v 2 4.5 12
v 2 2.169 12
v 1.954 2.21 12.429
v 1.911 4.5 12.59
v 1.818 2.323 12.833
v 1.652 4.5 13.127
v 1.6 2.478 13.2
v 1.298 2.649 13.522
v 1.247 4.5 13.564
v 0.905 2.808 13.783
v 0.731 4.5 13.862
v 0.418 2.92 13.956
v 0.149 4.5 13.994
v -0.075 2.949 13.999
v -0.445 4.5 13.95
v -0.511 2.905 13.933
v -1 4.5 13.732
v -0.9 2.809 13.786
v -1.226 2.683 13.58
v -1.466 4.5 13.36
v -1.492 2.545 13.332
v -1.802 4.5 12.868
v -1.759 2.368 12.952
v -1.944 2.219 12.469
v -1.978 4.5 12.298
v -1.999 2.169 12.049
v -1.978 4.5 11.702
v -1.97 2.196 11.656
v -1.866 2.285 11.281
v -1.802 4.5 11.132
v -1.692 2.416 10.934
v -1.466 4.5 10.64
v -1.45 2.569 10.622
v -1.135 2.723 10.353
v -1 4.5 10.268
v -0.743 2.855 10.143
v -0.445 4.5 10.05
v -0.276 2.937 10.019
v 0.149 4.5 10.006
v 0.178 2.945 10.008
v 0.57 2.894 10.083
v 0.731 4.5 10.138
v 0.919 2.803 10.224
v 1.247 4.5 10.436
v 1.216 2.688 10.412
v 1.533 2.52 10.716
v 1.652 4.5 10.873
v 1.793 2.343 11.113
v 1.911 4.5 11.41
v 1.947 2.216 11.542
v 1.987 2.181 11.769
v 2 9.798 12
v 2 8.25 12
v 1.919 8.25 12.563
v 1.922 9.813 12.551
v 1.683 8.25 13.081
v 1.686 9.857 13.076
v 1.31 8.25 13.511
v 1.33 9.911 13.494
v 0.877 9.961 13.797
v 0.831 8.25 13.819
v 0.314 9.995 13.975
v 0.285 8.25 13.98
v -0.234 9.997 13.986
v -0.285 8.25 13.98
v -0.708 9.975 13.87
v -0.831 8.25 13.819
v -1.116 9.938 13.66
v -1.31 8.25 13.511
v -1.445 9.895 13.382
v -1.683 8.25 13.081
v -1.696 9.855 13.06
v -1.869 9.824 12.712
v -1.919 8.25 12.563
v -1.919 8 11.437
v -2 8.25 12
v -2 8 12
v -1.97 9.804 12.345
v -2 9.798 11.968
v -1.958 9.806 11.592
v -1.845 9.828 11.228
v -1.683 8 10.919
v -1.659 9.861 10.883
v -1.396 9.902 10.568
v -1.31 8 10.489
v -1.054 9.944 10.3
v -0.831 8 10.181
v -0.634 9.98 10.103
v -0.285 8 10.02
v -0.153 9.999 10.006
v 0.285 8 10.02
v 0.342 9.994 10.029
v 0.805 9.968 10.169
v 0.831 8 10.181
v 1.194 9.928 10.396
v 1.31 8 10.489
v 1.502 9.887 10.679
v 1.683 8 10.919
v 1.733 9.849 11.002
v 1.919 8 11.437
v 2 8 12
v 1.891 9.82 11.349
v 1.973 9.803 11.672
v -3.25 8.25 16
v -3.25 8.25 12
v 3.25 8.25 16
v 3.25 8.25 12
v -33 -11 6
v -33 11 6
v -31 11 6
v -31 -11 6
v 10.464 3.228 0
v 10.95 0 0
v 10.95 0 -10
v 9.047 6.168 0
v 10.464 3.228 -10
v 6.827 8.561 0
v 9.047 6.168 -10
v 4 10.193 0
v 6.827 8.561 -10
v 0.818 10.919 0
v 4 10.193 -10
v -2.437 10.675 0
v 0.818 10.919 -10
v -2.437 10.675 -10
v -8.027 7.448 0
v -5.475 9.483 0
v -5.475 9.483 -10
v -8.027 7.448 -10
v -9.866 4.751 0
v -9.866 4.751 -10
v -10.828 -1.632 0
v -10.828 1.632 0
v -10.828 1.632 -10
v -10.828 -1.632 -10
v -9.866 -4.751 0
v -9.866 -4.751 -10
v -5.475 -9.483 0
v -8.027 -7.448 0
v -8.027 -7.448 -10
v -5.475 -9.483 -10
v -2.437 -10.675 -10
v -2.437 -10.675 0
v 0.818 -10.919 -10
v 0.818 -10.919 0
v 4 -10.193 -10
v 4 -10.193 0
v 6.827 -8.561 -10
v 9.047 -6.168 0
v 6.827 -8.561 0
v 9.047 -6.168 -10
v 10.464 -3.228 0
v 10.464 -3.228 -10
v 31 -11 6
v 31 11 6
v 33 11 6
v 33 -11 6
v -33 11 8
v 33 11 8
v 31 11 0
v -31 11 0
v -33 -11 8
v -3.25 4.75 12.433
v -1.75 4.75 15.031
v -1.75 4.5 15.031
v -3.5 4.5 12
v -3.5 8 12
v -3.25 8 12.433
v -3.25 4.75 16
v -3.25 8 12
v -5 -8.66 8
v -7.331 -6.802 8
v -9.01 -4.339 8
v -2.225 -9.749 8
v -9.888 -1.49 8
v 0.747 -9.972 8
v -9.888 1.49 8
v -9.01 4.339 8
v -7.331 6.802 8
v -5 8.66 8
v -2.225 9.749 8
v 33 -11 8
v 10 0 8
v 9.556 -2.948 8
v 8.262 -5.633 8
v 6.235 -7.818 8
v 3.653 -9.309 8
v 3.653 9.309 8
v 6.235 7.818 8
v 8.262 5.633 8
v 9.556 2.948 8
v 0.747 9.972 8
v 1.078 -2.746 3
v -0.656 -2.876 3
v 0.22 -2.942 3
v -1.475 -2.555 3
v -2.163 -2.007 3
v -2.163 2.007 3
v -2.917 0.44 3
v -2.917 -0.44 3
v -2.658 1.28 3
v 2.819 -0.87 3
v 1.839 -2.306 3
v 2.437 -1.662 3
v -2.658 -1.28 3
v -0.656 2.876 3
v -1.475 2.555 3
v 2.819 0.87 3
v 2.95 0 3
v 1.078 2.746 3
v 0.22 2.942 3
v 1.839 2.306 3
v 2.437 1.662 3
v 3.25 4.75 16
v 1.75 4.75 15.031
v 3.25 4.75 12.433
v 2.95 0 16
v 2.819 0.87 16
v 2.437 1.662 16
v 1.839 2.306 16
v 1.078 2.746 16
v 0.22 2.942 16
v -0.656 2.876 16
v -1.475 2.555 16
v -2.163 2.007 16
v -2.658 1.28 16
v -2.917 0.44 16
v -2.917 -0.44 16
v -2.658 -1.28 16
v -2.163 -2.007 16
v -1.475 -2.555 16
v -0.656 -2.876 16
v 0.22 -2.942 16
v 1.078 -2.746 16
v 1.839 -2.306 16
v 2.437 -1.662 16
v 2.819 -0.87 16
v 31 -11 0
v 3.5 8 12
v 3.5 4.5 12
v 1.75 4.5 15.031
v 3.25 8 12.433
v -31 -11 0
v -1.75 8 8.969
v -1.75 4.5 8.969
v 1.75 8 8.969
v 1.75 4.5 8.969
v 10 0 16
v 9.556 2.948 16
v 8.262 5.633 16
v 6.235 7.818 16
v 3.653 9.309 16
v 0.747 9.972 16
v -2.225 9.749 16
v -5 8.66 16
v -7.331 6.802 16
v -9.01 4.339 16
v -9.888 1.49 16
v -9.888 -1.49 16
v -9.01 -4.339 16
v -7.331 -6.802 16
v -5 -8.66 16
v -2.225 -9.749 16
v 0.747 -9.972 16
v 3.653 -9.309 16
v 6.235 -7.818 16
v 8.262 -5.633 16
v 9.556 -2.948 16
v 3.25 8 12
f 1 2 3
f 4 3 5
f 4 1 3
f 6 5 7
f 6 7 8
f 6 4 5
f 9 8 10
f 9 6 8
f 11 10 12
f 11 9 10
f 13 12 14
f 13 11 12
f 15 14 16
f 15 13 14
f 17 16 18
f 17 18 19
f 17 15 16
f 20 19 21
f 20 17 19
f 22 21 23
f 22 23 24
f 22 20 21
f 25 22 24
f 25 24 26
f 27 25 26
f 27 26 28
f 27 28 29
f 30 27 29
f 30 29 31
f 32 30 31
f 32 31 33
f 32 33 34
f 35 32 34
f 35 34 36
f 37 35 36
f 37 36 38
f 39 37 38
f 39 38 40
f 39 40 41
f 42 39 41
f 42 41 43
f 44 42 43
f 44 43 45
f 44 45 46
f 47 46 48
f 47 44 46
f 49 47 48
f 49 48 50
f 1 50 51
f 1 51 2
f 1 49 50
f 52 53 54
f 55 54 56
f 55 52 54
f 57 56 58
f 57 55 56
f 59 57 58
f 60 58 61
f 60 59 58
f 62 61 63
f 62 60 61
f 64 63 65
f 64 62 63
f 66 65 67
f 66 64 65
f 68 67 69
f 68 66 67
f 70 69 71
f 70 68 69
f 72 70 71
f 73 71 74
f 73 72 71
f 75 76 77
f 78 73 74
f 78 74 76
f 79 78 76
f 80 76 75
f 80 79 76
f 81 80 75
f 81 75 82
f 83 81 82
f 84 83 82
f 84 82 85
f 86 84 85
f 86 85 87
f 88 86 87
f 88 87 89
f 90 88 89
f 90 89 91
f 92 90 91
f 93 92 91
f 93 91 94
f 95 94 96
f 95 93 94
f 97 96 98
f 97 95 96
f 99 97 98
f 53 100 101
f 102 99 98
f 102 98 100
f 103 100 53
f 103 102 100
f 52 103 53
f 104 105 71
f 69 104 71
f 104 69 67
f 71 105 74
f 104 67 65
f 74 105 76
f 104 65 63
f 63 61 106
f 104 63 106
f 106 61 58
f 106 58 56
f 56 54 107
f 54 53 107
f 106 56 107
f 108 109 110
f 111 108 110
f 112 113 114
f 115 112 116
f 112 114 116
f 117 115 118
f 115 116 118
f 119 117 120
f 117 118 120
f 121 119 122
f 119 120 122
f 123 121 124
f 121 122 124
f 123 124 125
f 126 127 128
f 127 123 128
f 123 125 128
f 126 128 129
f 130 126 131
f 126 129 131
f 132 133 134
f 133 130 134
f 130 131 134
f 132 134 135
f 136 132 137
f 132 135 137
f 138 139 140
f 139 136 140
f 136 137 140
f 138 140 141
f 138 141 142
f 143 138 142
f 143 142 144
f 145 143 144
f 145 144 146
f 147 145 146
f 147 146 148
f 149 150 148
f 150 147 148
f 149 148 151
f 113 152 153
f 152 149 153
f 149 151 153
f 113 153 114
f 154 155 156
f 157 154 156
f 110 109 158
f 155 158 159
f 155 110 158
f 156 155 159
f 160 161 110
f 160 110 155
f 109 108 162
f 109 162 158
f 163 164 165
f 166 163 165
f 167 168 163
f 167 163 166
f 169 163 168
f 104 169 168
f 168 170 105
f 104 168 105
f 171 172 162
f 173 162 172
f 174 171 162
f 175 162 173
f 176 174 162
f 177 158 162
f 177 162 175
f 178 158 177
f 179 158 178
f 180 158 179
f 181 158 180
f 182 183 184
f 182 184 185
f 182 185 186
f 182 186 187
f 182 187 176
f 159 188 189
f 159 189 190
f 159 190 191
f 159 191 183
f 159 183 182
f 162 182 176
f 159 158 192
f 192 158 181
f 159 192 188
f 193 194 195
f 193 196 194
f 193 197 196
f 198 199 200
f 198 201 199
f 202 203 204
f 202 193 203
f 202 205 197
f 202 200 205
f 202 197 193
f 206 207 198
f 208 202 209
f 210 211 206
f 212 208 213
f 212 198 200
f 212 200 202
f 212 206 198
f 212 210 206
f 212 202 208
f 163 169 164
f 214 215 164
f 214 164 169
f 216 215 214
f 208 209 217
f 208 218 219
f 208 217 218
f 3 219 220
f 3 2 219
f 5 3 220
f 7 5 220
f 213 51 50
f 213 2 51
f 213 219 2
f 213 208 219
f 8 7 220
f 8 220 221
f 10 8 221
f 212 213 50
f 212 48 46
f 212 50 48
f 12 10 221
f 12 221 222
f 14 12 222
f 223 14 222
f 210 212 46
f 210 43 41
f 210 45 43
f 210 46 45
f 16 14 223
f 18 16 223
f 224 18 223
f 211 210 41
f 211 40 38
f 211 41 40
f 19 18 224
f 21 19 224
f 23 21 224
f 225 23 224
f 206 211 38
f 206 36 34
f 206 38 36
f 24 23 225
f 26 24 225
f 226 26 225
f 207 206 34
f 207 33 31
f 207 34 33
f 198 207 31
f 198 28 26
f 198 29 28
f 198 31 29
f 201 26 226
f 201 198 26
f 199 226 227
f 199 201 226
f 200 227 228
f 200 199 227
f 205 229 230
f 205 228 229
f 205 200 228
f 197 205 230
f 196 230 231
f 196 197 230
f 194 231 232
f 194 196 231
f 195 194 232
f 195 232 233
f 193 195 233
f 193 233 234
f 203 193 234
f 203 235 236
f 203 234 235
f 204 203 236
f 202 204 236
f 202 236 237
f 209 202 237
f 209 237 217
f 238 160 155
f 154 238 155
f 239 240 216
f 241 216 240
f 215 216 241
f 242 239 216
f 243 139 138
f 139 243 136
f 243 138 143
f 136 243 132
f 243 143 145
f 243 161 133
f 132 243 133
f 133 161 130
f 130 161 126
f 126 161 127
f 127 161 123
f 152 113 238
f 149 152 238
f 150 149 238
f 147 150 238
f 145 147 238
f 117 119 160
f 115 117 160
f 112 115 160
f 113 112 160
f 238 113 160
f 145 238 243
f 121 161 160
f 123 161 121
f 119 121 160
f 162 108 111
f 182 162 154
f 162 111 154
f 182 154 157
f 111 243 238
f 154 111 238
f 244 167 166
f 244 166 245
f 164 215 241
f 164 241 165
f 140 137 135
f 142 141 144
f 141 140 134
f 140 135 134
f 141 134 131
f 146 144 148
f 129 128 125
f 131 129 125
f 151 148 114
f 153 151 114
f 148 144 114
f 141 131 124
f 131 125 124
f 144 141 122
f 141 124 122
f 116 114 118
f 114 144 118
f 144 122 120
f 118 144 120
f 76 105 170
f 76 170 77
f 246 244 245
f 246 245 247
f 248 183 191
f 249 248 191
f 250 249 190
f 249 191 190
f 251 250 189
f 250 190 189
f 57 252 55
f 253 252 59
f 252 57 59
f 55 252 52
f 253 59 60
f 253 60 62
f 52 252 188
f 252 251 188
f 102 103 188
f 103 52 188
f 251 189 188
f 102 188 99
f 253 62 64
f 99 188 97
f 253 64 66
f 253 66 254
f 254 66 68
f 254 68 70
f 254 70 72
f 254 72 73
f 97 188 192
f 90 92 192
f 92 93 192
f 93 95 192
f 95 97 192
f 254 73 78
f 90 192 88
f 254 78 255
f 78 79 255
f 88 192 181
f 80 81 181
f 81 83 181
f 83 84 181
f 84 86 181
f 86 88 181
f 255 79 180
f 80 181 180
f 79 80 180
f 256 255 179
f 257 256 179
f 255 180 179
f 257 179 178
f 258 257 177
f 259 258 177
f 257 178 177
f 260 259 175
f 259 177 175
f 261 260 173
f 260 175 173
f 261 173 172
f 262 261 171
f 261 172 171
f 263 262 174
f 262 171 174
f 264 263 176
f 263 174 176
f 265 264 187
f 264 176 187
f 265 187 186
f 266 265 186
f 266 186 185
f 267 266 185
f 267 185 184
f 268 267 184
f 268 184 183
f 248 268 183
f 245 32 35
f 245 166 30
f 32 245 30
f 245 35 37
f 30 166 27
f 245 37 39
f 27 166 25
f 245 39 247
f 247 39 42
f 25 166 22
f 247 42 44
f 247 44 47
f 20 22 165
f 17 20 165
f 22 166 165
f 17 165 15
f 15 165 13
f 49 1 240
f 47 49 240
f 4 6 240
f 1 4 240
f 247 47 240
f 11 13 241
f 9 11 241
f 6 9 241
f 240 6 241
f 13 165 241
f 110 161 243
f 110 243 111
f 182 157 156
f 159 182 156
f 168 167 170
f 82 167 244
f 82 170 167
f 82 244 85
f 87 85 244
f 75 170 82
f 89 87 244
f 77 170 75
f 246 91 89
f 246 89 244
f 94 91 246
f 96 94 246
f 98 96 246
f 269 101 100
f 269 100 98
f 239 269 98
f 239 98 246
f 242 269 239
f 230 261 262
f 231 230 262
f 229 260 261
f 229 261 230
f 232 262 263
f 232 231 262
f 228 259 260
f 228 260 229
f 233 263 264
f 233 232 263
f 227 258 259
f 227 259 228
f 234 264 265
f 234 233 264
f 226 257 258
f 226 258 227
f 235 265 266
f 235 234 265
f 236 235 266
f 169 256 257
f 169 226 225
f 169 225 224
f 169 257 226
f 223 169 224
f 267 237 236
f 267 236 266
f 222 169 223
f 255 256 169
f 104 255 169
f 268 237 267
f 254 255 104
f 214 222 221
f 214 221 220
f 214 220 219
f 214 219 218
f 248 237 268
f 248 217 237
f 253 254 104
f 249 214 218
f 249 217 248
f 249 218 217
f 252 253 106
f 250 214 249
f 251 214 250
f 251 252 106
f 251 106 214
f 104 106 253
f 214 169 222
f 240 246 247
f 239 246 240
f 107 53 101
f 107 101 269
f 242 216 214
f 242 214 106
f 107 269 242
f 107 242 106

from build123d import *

# Parameters (mm, degrees)
BOX003_W          = 5
BOX003_H          = 22
BOX003_DEPTH      = 2
BOX_W             = 5
BOX_H             = 22
BOX_DEPTH         = 2
CYLINDER006_R     = 2.95
CYLINDER006_DEPTH = 25
CYLINDER007_R     = 2.85
CYLINDER007_DEPTH = 25
BOX002_W          = 62
BOX002_H          = 8
BOX002_DEPTH      = 22
CYLINDER010_R     = 2
CYLINDER010_DEPTH = 10
BOX004_W          = 6.5
BOX004_H          = 3.5
BOX004_DEPTH      = 6.5
PRISM002_DEPTH    = 3.5
CYLINDER009_R     = 2.85
CYLINDER009_DEPTH = 25
CYLINDER008_R     = 10
CYLINDER008_DEPTH = 13
CYLINDER011_R     = 10.95
CYLINDER011_DEPTH = 13


with BuildPart() as cubo003:
    # Box003 → Box003 (new body)
    with BuildSketch(Plane(origin=(28, -11, 6), x_dir=(1, 0, 0), z_dir=(0, 0, 1))):
        with Locations((2.5, 11)):
            Rectangle(BOX003_W, BOX003_H)
    extrude(amount=BOX003_DEPTH)


with BuildPart() as cubo:
    # Box → Box (new body)
    with BuildSketch(Plane(origin=(-33, -11, 6), x_dir=(1, 0, 0), z_dir=(0, 0, 1))):
        with Locations((2.5, 11)):
            Rectangle(BOX_W, BOX_H)
    extrude(amount=BOX_DEPTH)


with BuildPart() as cilindro006:
    # Cylinder006 → Cylinder006 (new body)
    with BuildSketch(Plane.XY.offset(-7)):
        Circle(CYLINDER006_R)
    extrude(amount=CYLINDER006_DEPTH)


with BuildPart() as cilindro007:
    # Cylinder007 → Cylinder007 (new body)
    with BuildSketch(Plane.XY.offset(-7)):
        Circle(CYLINDER007_R)
    extrude(amount=CYLINDER007_DEPTH)


with BuildPart() as cut:
    # Box002 → Box002 (new body)
    with BuildSketch(Plane(origin=(-31, 11, 0), x_dir=(1, 0, 0), z_dir=(0, -1, 0))):
        with Locations((31, 4)):
            Rectangle(BOX002_W, BOX002_H)
    extrude(amount=BOX002_DEPTH)

    # Cut: cut Cilindro007
    add(cilindro007.part, mode=Mode.SUBTRACT)


with BuildPart() as cilindro010:
    # Cylinder010 → Cylinder010 (new body)
    with BuildSketch(Plane(origin=(0, 11, 9), x_dir=(1, 0, 0), z_dir=(0, -1, 0))):
        Circle(CYLINDER010_R)
    extrude(amount=CYLINDER010_DEPTH)


with BuildPart() as cubo004:
    # Box004 → Box004 (new body)
    with BuildSketch(Plane(origin=(-3.25, 4.75, 9), x_dir=(1, 0, 0), z_dir=(0, 0, 1))):
        with Locations((3.25, 1.75)):
            Rectangle(BOX004_W, BOX004_H)
    extrude(amount=BOX004_DEPTH)


with BuildPart() as prisma002:
    # Prism002 → Prism002 (new body)
    with BuildSketch(Plane(origin=(0, 8, 9), x_dir=(1, 0, 0), z_dir=(0, -1, 0))):
        Polygon((3.5, 0), (1.75, 3.031089), (-1.75, 3.031089), (-3.5, 0), (-1.75, -3.031089), (1.75, -3.031089), align=None)
    extrude(amount=PRISM002_DEPTH)


with BuildPart() as cilindro009:
    # Cylinder009 → Cylinder009 (new body)
    with BuildSketch(Plane.XY.offset(-7)):
        Circle(CYLINDER009_R)
    extrude(amount=CYLINDER009_DEPTH)


with BuildPart() as fusion004:
    # Cylinder008 → Cylinder008 (new body)
    with BuildSketch(Plane.XY):
        Circle(CYLINDER008_R)
    extrude(amount=CYLINDER008_DEPTH)

    # Cut007: cut Cilindro009
    add(cilindro009.part, mode=Mode.SUBTRACT)

    # Cut008: cut Prisma002
    add(prisma002.part, mode=Mode.SUBTRACT)

    # Cut009: cut Cubo004
    add(cubo004.part, mode=Mode.SUBTRACT)

    # Cut010: cut Cilindro010
    add(cilindro010.part, mode=Mode.SUBTRACT)


with BuildPart() as fusion004_1:
    # Cut010 placement: moved
    add(fusion004.part.moved(Location((0, 0, 3))))

    # Fusion002: union Cut
    add(cut.part)

    # Cut011: cut Cilindro006
    add(cilindro006.part, mode=Mode.SUBTRACT)

    # Fusion003: union Cubo
    add(cubo.part)

    # Fusion004: union Cubo003
    add(cubo003.part)


with BuildPart() as fusion004003:
    # Cylinder011 → Cylinder011 (new body)
    with BuildSketch(Plane.XY.offset(-10)):
        Circle(CYLINDER011_R)
    extrude(amount=CYLINDER011_DEPTH)

    # Fusion004003: union Fusion004
    add(fusion004_1.part)


solid = fusion004003.part
